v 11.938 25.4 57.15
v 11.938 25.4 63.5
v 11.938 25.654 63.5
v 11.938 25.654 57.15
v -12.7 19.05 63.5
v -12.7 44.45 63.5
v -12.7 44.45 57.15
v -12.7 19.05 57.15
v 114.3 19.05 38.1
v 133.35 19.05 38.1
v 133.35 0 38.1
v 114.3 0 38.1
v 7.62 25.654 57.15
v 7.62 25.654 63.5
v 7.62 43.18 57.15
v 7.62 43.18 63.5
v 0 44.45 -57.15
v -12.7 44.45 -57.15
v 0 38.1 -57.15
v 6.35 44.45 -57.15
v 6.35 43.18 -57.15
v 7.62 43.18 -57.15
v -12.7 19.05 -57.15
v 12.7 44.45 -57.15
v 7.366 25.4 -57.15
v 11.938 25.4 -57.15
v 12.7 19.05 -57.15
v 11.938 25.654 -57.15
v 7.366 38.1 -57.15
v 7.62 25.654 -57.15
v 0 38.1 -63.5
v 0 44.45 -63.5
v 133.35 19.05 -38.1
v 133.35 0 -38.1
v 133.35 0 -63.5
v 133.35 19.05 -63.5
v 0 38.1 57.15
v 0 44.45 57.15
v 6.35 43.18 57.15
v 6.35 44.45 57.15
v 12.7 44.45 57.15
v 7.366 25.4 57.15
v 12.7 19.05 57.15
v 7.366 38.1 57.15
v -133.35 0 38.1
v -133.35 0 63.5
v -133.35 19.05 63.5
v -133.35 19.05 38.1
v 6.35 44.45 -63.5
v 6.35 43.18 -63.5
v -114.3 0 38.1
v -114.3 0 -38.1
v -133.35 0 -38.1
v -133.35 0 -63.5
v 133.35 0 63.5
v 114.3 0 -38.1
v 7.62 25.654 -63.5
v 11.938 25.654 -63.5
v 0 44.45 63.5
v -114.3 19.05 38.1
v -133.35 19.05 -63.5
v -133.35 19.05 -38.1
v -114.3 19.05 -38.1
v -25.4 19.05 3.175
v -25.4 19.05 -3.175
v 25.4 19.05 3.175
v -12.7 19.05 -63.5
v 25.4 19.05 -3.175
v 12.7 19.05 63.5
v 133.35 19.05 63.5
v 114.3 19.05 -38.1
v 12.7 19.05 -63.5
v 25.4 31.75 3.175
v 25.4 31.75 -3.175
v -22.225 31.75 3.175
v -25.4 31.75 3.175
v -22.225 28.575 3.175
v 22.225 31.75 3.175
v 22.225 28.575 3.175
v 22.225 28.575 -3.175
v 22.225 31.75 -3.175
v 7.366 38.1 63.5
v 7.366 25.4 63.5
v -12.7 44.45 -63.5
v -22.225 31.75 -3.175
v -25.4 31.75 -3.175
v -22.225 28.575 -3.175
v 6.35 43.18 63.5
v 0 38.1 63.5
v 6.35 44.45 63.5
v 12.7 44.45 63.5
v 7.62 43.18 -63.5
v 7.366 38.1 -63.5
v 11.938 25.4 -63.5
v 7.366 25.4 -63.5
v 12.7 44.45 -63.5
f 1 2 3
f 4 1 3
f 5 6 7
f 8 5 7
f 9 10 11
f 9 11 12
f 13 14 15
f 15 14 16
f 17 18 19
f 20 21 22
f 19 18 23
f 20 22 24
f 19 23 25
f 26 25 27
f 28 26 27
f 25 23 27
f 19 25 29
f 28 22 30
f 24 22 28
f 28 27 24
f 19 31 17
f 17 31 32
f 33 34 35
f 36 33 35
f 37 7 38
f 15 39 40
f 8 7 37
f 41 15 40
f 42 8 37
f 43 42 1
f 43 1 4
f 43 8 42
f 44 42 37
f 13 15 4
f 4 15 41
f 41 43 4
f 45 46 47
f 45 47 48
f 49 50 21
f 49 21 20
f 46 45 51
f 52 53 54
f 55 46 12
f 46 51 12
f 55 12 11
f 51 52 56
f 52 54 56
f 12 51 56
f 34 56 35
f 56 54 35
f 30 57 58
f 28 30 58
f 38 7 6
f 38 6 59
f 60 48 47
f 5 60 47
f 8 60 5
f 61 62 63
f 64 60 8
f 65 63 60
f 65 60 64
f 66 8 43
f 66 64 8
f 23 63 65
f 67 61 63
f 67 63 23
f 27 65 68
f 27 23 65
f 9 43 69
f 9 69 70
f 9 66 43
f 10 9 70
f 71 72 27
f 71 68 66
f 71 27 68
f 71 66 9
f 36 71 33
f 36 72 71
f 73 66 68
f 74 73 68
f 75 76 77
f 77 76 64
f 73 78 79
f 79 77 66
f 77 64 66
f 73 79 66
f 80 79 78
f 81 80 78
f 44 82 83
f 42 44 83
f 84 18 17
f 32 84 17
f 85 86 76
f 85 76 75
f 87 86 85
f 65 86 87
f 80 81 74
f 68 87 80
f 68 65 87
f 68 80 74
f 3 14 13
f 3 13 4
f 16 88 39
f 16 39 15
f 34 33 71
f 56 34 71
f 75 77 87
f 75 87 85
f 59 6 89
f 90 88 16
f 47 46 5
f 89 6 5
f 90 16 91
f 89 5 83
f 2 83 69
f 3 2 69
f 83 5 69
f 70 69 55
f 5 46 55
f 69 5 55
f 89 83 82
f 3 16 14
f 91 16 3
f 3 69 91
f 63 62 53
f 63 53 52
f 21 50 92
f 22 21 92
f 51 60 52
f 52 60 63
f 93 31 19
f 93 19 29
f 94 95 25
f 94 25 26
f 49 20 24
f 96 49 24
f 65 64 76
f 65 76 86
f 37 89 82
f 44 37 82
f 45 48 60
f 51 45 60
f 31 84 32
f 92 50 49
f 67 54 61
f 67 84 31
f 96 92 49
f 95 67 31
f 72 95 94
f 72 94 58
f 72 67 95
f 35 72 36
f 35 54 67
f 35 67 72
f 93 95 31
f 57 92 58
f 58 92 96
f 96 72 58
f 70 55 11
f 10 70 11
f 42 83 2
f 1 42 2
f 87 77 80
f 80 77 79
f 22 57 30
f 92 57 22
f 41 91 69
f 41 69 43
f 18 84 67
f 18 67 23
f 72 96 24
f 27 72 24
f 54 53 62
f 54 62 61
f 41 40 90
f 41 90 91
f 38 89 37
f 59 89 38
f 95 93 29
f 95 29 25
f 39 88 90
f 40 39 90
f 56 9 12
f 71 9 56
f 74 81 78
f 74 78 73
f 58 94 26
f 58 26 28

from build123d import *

# Parameters (mm, degrees)
SKETCH1_W           = 266.7
SKETCH1_H           = 127
BOSS_EXTRUDE1_DEPTH = 19.05
SKETCH2_W           = 19.05
SKETCH2_H           = 76.2
CUT_EXTRUDE1_DEPTH  = 149.920700374
SKETCH3_W           = 25.4
SKETCH3_H           = 6.35
BOSS_EXTRUDE2_DEPTH = 25.4
SKETCH5_W           = 6.35
SKETCH5_H           = 6.35
CUT_EXTRUDE2_DEPTH  = 190.438710405
SKETCH6_W           = 1.27
SKETCH6_H           = 5.08
CUT_EXTRUDE3_DEPTH  = 190.438710405
SKETCH7_W           = 0.254
SKETCH7_H           = 12.446
SKETCH7_W_2         = 4.318
SKETCH7_H_2         = 0.254
CUT_EXTRUDE4_DEPTH  = 190.438710405
SKETCH8_W           = 50.8
SKETCH8_H           = 6.35
BOSS_EXTRUDE3_DEPTH = 12.7
CUT_EXTRUDE5_REACH  = 157.575
SKETCH9_W           = 44.45
SKETCH9_H           = 6.35


with BuildPart() as part:
    # Sketch1 → Boss-Extrude1 (new body)
    with BuildSketch(Plane(origin=(0, 0, 0), x_dir=(1, 0, 0), z_dir=(0, 1, 0))):
        Rectangle(SKETCH1_W, SKETCH1_H)
    extrude(amount=BOSS_EXTRUDE1_DEPTH)

    # Sketch2 → Cut-Extrude1 (cut, through all)
    with BuildSketch(Plane(origin=(0, 19.05, 0), x_dir=(1, 0, 0), z_dir=(0, 1, 0))):
        with Locations((-123.825, 0)):
            Rectangle(SKETCH2_W, SKETCH2_H)
    cut_extrude1 = extrude(amount=-CUT_EXTRUDE1_DEPTH, mode=Mode.SUBTRACT)

    # Mirror1: Cut-Extrude1 across plane
    add(cut_extrude1.mirror(Plane(origin=(0, 0, 0), x_dir=(0, 0, 1), z_dir=(1, 0, 0))), mode=Mode.SUBTRACT)

    # Sketch3 → Boss-Extrude2 (add)
    with BuildSketch(Plane(origin=(0, 19.05, 0), x_dir=(1, 0, 0), z_dir=(0, 1, 0))):
        with Locations((0, -60.325)):
            Rectangle(SKETCH3_W, SKETCH3_H)
    boss_extrude2 = extrude(amount=BOSS_EXTRUDE2_DEPTH)

    # Sketch5 → Cut-Extrude2 (cut, through all)
    with BuildSketch(Plane.XY.offset(63.5)):
        with Locations((3.175, 41.275)):
            Rectangle(SKETCH5_W, SKETCH5_H)
    cut_extrude2 = extrude(amount=-CUT_EXTRUDE2_DEPTH, mode=Mode.SUBTRACT)

    # Sketch6 → Cut-Extrude3 (cut, through all)
    with BuildSketch(Plane.XY.offset(63.5)):
        with Locations((6.985, 40.64)):
            Rectangle(SKETCH6_W, SKETCH6_H)
    cut_extrude3 = extrude(amount=-CUT_EXTRUDE3_DEPTH, mode=Mode.SUBTRACT)

    # Sketch7 → Cut-Extrude4 (cut, through all)
    with BuildSketch(Plane.XY.offset(63.5)):
        with Locations((7.493, 31.877)):
            Rectangle(SKETCH7_W, SKETCH7_H)
        with Locations((9.779, 25.527)):
            Rectangle(SKETCH7_W_2, SKETCH7_H_2)
        with Locations((7.493, 25.527)):
            Rectangle(SKETCH7_W, SKETCH7_H_2)
    cut_extrude4 = extrude(amount=-CUT_EXTRUDE4_DEPTH, mode=Mode.SUBTRACT)

    # Mirror2: Boss-Extrude2, Cut-Extrude2, Cut-Extrude3, Cut-Extrude4 across plane
    add(boss_extrude2.mirror(Plane.XY))
    add(cut_extrude2.mirror(Plane.XY), mode=Mode.SUBTRACT)
    add(cut_extrude3.mirror(Plane.XY), mode=Mode.SUBTRACT)
    add(cut_extrude4.mirror(Plane.XY), mode=Mode.SUBTRACT)

    # Sketch8 → Boss-Extrude3 (add)
    with BuildSketch(Plane(origin=(0, 19.05, 0), x_dir=(1, 0, 0), z_dir=(0, 1, 0))):
        Rectangle(SKETCH8_W, SKETCH8_H)
    extrude(amount=BOSS_EXTRUDE3_DEPTH)

    # Sketch9 → Cut-Extrude5 (cut, up to next)
    with BuildSketch(Plane.XY.offset(3.175), mode=Mode.PRIVATE) as cut_extrude5_sk1:
        with Locations((0, 31.75)):
            Rectangle(SKETCH9_W, SKETCH9_H)
    cut_extrude5_tool1 = extrude(cut_extrude5_sk1.sketch, amount=-CUT_EXTRUDE5_REACH, mode=Mode.PRIVATE) & part.part
    add(cut_extrude5_tool1.solids().sort_by_distance((0, 31.75, 3.175))[0], mode=Mode.SUBTRACT)


solid = part.part
